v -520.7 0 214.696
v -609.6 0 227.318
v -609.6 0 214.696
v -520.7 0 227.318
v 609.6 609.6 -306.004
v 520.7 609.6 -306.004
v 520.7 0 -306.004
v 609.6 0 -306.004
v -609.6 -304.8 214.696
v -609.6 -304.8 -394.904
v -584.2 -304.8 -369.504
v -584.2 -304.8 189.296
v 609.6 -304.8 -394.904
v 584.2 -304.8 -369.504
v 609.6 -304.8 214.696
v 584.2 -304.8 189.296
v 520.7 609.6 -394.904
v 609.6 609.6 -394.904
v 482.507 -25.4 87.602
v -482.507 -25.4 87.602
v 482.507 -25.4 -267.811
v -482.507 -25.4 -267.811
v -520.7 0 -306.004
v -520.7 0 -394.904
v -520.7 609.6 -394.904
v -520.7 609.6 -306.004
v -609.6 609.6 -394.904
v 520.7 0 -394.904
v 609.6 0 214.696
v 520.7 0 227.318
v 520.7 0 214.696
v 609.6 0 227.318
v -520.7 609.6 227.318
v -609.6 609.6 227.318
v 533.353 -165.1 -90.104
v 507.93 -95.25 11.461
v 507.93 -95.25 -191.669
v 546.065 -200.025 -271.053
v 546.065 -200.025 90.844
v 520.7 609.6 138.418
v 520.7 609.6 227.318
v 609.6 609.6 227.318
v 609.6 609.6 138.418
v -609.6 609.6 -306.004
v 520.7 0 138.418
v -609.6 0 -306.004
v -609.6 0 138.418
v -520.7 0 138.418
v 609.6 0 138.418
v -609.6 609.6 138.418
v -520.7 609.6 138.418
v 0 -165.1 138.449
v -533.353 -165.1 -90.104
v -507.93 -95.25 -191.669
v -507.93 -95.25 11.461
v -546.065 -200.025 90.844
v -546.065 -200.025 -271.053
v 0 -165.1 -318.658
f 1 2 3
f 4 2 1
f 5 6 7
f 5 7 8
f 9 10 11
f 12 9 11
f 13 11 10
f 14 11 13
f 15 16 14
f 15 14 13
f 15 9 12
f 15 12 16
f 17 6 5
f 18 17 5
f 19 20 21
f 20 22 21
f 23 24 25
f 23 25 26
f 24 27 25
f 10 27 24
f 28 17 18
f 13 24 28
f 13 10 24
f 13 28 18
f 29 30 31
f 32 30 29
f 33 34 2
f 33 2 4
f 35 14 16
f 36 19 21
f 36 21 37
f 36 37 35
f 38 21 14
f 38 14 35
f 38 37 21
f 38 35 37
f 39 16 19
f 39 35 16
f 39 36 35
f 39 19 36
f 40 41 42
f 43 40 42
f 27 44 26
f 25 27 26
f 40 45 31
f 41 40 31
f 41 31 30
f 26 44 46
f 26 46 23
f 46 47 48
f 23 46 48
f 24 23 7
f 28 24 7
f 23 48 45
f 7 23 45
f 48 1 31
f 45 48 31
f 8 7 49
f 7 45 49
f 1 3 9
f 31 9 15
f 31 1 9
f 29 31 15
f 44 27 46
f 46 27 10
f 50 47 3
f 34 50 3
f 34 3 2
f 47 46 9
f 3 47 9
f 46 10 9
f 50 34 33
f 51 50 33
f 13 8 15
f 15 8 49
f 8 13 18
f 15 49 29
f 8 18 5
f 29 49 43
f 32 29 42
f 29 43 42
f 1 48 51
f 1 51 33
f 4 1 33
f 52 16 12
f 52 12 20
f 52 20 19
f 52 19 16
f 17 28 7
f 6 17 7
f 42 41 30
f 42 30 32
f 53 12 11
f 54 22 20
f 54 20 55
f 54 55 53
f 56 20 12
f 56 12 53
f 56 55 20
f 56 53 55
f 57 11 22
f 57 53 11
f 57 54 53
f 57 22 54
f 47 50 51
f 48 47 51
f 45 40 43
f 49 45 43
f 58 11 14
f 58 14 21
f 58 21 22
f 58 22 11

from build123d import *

# Parameters (mm, degrees)
F0_W     = 1219.2
F0_H     = 609.6
F1_DEPTH = 304.8
F2_W     = 1168.4
F2_H     = 558.8
F3_DEPTH = 279.4
F3_TAPER = 20
F4_W     = 88.9
F4_H     = 88.9
F5_DEPTH = 609.6


with BuildPart() as f1:
    # F0 (on Front) → F1 (new body)
    with BuildSketch(Plane.XZ):
        with Locations((0, -90.1043365546)):
            Rectangle(F0_W, F0_H)
    extrude(amount=F1_DEPTH)

    # F2 (on face) → F3 (cut)
    with BuildSketch(Plane.XZ.offset(304.8)):
        with Locations((0, -90.1043365546)):
            Rectangle(F2_W, F2_H)
    extrude(amount=-F3_DEPTH, taper=F3_TAPER, mode=Mode.SUBTRACT)

    # F4 (on face) → F5 (join)
    with BuildSketch(Plane.XZ):
        with Locations((-565.15, -350.4543365546)):
            Rectangle(F4_W, F4_H)
        with Locations((565.15, -350.4543365546)):
            Rectangle(F4_W, F4_H)
        with Locations((565.15, 182.8677715369)):
            Rectangle(F4_W, F4_H)
        with Locations((-565.15, 182.8677715369)):
            Rectangle(F4_W, F4_H)
    extrude(amount=-F5_DEPTH)


solid = f1.part
